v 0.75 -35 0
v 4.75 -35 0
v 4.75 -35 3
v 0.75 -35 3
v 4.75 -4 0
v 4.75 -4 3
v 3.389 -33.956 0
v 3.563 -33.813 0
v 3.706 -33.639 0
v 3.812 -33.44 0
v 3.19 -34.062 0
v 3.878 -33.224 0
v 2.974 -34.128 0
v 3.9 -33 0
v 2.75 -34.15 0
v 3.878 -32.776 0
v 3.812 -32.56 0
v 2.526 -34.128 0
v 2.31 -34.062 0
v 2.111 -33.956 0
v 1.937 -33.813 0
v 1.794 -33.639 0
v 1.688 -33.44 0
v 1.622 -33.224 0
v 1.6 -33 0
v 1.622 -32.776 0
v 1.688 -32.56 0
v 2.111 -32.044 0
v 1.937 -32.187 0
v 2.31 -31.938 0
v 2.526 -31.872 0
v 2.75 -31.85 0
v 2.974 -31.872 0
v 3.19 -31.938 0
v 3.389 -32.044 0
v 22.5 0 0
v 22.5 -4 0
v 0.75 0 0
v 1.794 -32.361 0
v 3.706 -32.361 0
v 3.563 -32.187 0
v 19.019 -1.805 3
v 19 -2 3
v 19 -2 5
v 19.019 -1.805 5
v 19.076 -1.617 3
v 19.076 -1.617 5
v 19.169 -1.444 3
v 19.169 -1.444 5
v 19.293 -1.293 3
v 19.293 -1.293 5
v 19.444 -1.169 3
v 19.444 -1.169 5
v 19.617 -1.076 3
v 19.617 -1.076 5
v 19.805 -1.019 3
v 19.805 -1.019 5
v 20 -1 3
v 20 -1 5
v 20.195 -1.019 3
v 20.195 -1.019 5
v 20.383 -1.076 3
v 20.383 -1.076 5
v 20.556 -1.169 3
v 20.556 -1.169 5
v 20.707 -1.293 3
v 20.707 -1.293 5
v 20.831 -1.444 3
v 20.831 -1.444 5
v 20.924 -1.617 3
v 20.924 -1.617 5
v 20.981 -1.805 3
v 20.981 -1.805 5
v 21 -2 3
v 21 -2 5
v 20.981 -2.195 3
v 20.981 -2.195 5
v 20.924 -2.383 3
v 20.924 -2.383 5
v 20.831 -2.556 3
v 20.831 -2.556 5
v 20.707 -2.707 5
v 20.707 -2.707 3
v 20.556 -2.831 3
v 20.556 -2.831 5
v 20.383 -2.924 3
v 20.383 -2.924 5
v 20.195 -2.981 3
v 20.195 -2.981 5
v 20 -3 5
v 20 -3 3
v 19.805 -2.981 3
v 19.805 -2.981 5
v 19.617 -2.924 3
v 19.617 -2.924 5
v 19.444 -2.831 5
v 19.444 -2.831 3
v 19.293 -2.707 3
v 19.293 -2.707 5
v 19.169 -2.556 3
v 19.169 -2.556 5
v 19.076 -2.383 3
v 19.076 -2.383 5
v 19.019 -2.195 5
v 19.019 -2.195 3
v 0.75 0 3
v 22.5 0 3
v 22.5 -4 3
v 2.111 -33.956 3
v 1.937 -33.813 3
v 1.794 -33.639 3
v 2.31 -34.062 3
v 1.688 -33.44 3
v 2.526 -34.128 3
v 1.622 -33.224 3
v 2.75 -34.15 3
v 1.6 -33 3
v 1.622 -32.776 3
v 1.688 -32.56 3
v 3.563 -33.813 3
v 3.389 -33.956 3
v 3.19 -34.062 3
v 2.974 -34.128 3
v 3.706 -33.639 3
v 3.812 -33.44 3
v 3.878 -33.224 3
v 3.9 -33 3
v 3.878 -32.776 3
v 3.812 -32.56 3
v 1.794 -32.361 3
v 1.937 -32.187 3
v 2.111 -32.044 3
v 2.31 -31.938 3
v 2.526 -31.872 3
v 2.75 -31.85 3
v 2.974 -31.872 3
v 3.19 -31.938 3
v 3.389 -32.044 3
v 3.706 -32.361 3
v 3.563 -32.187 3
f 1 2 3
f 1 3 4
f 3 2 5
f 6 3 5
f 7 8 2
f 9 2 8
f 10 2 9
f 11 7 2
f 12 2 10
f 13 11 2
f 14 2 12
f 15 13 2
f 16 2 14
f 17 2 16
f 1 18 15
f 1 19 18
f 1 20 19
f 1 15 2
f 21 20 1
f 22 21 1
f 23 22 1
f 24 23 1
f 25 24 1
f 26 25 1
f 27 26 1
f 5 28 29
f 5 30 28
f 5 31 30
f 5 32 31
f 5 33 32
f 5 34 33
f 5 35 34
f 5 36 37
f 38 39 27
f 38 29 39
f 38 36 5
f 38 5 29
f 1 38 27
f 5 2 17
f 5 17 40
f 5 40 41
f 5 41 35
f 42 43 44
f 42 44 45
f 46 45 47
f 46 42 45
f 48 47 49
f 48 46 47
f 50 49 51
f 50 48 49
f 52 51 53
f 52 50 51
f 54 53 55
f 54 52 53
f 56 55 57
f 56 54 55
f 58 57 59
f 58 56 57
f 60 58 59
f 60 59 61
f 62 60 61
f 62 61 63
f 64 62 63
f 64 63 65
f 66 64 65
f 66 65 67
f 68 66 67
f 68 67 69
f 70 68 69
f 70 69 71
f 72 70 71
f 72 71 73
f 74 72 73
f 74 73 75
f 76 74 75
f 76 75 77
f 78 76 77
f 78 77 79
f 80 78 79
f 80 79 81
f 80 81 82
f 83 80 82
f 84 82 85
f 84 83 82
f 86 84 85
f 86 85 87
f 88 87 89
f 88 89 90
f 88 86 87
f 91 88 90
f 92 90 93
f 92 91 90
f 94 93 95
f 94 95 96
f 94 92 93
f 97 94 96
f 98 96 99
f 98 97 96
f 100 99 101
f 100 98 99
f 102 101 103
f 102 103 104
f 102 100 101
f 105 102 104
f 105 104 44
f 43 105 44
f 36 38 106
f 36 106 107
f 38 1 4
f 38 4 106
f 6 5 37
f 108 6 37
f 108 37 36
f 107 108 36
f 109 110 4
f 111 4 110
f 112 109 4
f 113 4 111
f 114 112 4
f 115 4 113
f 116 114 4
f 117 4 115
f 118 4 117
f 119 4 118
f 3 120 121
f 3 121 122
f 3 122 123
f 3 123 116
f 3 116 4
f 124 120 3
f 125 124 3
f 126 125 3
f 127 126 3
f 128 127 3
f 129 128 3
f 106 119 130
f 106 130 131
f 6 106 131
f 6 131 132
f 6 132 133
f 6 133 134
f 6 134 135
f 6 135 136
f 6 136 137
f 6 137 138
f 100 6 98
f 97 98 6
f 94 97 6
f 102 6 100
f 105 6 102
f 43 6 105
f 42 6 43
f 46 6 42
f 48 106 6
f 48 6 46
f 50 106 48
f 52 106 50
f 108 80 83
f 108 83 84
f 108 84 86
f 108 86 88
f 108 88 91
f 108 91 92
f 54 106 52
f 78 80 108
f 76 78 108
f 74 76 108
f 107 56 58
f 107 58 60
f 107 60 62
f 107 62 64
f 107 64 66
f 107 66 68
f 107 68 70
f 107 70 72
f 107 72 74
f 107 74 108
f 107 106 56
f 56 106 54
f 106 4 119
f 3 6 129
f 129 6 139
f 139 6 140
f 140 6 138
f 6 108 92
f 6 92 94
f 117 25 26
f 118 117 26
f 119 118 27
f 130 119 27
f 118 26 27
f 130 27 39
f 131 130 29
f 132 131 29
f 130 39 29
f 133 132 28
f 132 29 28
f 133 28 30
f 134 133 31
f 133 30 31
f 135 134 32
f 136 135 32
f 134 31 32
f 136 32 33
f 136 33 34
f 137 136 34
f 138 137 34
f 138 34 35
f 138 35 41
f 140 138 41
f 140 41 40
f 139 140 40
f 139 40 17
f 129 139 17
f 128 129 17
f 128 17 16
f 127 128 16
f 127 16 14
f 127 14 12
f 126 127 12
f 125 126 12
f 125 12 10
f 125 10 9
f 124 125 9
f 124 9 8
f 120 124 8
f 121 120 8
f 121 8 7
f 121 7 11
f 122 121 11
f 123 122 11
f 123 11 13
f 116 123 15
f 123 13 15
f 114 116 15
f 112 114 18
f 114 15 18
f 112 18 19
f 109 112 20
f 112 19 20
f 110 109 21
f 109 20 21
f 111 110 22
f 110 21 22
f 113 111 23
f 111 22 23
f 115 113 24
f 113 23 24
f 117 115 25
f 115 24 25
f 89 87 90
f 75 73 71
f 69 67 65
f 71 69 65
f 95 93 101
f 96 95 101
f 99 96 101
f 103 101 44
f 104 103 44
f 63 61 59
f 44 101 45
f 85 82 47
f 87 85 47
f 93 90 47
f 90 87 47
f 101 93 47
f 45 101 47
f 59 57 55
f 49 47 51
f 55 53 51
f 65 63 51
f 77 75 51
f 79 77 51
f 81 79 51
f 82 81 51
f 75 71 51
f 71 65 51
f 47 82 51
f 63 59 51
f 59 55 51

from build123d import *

# Parameters (mm, degrees)
CROQUIS1_W              = 22.5
CROQUIS1_H              = 4
SALIENTE_EXTRUIR1_DEPTH = 3
CROQUIS5_W              = 4
CROQUIS5_H              = 31
CROQUIS5_R              = 1.05
SALIENTE_EXTRUIR3_DEPTH = 3
CROQUIS10_W             = 1.164205216
CROQUIS10_H             = 4.577506348
CORTAR_EXTRUIR4_DEPTH   = 42.716303767
CROQUIS3_R              = 1
SALIENTE_EXTRUIR4_DEPTH = 5
CROQUIS11_R             = 1.15
CORTAR_EXTRUIR5_DEPTH   = 42.907636536


with BuildPart() as part:
    # Croquis1 → Saliente-Extruir1 (new body)
    with BuildSketch(Plane.XY):
        with Locations((11.25, -2)):
            Rectangle(CROQUIS1_W, CROQUIS1_H)
    extrude(amount=SALIENTE_EXTRUIR1_DEPTH)

    # Croquis5 → Saliente-Extruir3 (add)
    with BuildSketch(Plane(origin=(0, 0, 0), x_dir=(-1, 0, 0), z_dir=(0, 0, -1))):
        with Locations((-2.75, -19.5)):
            Rectangle(CROQUIS5_W, CROQUIS5_H)
        with Locations((-2.75, -33)):
            Circle(CROQUIS5_R, mode=Mode.SUBTRACT)
    extrude(amount=-SALIENTE_EXTRUIR3_DEPTH)

    # Croquis10 → Cortar-Extruir4 (cut, through all)
    with BuildSketch(Plane.XY.offset(3)):
        with Locations((0.167897392, -1.711246826)):
            Rectangle(CROQUIS10_W, CROQUIS10_H)
    extrude(amount=-CORTAR_EXTRUIR4_DEPTH, mode=Mode.SUBTRACT)

    # Croquis3 → Saliente-Extruir4 (add)
    with BuildSketch(Plane(origin=(0, 0, 0), x_dir=(-1, 0, 0), z_dir=(0, 0, -1))):
        with Locations((-20, -2)):
            Circle(CROQUIS3_R)
    extrude(amount=-SALIENTE_EXTRUIR4_DEPTH)

    # Croquis11 → Cortar-Extruir5 (cut, through all)
    with BuildSketch(Plane(origin=(0, 0, 0), x_dir=(-1, 0, 0), z_dir=(0, 0, -1))):
        with Locations((-2.75, -33)):
            Circle(CROQUIS11_R)
    extrude(amount=-CORTAR_EXTRUIR5_DEPTH, mode=Mode.SUBTRACT)


solid = part.part
